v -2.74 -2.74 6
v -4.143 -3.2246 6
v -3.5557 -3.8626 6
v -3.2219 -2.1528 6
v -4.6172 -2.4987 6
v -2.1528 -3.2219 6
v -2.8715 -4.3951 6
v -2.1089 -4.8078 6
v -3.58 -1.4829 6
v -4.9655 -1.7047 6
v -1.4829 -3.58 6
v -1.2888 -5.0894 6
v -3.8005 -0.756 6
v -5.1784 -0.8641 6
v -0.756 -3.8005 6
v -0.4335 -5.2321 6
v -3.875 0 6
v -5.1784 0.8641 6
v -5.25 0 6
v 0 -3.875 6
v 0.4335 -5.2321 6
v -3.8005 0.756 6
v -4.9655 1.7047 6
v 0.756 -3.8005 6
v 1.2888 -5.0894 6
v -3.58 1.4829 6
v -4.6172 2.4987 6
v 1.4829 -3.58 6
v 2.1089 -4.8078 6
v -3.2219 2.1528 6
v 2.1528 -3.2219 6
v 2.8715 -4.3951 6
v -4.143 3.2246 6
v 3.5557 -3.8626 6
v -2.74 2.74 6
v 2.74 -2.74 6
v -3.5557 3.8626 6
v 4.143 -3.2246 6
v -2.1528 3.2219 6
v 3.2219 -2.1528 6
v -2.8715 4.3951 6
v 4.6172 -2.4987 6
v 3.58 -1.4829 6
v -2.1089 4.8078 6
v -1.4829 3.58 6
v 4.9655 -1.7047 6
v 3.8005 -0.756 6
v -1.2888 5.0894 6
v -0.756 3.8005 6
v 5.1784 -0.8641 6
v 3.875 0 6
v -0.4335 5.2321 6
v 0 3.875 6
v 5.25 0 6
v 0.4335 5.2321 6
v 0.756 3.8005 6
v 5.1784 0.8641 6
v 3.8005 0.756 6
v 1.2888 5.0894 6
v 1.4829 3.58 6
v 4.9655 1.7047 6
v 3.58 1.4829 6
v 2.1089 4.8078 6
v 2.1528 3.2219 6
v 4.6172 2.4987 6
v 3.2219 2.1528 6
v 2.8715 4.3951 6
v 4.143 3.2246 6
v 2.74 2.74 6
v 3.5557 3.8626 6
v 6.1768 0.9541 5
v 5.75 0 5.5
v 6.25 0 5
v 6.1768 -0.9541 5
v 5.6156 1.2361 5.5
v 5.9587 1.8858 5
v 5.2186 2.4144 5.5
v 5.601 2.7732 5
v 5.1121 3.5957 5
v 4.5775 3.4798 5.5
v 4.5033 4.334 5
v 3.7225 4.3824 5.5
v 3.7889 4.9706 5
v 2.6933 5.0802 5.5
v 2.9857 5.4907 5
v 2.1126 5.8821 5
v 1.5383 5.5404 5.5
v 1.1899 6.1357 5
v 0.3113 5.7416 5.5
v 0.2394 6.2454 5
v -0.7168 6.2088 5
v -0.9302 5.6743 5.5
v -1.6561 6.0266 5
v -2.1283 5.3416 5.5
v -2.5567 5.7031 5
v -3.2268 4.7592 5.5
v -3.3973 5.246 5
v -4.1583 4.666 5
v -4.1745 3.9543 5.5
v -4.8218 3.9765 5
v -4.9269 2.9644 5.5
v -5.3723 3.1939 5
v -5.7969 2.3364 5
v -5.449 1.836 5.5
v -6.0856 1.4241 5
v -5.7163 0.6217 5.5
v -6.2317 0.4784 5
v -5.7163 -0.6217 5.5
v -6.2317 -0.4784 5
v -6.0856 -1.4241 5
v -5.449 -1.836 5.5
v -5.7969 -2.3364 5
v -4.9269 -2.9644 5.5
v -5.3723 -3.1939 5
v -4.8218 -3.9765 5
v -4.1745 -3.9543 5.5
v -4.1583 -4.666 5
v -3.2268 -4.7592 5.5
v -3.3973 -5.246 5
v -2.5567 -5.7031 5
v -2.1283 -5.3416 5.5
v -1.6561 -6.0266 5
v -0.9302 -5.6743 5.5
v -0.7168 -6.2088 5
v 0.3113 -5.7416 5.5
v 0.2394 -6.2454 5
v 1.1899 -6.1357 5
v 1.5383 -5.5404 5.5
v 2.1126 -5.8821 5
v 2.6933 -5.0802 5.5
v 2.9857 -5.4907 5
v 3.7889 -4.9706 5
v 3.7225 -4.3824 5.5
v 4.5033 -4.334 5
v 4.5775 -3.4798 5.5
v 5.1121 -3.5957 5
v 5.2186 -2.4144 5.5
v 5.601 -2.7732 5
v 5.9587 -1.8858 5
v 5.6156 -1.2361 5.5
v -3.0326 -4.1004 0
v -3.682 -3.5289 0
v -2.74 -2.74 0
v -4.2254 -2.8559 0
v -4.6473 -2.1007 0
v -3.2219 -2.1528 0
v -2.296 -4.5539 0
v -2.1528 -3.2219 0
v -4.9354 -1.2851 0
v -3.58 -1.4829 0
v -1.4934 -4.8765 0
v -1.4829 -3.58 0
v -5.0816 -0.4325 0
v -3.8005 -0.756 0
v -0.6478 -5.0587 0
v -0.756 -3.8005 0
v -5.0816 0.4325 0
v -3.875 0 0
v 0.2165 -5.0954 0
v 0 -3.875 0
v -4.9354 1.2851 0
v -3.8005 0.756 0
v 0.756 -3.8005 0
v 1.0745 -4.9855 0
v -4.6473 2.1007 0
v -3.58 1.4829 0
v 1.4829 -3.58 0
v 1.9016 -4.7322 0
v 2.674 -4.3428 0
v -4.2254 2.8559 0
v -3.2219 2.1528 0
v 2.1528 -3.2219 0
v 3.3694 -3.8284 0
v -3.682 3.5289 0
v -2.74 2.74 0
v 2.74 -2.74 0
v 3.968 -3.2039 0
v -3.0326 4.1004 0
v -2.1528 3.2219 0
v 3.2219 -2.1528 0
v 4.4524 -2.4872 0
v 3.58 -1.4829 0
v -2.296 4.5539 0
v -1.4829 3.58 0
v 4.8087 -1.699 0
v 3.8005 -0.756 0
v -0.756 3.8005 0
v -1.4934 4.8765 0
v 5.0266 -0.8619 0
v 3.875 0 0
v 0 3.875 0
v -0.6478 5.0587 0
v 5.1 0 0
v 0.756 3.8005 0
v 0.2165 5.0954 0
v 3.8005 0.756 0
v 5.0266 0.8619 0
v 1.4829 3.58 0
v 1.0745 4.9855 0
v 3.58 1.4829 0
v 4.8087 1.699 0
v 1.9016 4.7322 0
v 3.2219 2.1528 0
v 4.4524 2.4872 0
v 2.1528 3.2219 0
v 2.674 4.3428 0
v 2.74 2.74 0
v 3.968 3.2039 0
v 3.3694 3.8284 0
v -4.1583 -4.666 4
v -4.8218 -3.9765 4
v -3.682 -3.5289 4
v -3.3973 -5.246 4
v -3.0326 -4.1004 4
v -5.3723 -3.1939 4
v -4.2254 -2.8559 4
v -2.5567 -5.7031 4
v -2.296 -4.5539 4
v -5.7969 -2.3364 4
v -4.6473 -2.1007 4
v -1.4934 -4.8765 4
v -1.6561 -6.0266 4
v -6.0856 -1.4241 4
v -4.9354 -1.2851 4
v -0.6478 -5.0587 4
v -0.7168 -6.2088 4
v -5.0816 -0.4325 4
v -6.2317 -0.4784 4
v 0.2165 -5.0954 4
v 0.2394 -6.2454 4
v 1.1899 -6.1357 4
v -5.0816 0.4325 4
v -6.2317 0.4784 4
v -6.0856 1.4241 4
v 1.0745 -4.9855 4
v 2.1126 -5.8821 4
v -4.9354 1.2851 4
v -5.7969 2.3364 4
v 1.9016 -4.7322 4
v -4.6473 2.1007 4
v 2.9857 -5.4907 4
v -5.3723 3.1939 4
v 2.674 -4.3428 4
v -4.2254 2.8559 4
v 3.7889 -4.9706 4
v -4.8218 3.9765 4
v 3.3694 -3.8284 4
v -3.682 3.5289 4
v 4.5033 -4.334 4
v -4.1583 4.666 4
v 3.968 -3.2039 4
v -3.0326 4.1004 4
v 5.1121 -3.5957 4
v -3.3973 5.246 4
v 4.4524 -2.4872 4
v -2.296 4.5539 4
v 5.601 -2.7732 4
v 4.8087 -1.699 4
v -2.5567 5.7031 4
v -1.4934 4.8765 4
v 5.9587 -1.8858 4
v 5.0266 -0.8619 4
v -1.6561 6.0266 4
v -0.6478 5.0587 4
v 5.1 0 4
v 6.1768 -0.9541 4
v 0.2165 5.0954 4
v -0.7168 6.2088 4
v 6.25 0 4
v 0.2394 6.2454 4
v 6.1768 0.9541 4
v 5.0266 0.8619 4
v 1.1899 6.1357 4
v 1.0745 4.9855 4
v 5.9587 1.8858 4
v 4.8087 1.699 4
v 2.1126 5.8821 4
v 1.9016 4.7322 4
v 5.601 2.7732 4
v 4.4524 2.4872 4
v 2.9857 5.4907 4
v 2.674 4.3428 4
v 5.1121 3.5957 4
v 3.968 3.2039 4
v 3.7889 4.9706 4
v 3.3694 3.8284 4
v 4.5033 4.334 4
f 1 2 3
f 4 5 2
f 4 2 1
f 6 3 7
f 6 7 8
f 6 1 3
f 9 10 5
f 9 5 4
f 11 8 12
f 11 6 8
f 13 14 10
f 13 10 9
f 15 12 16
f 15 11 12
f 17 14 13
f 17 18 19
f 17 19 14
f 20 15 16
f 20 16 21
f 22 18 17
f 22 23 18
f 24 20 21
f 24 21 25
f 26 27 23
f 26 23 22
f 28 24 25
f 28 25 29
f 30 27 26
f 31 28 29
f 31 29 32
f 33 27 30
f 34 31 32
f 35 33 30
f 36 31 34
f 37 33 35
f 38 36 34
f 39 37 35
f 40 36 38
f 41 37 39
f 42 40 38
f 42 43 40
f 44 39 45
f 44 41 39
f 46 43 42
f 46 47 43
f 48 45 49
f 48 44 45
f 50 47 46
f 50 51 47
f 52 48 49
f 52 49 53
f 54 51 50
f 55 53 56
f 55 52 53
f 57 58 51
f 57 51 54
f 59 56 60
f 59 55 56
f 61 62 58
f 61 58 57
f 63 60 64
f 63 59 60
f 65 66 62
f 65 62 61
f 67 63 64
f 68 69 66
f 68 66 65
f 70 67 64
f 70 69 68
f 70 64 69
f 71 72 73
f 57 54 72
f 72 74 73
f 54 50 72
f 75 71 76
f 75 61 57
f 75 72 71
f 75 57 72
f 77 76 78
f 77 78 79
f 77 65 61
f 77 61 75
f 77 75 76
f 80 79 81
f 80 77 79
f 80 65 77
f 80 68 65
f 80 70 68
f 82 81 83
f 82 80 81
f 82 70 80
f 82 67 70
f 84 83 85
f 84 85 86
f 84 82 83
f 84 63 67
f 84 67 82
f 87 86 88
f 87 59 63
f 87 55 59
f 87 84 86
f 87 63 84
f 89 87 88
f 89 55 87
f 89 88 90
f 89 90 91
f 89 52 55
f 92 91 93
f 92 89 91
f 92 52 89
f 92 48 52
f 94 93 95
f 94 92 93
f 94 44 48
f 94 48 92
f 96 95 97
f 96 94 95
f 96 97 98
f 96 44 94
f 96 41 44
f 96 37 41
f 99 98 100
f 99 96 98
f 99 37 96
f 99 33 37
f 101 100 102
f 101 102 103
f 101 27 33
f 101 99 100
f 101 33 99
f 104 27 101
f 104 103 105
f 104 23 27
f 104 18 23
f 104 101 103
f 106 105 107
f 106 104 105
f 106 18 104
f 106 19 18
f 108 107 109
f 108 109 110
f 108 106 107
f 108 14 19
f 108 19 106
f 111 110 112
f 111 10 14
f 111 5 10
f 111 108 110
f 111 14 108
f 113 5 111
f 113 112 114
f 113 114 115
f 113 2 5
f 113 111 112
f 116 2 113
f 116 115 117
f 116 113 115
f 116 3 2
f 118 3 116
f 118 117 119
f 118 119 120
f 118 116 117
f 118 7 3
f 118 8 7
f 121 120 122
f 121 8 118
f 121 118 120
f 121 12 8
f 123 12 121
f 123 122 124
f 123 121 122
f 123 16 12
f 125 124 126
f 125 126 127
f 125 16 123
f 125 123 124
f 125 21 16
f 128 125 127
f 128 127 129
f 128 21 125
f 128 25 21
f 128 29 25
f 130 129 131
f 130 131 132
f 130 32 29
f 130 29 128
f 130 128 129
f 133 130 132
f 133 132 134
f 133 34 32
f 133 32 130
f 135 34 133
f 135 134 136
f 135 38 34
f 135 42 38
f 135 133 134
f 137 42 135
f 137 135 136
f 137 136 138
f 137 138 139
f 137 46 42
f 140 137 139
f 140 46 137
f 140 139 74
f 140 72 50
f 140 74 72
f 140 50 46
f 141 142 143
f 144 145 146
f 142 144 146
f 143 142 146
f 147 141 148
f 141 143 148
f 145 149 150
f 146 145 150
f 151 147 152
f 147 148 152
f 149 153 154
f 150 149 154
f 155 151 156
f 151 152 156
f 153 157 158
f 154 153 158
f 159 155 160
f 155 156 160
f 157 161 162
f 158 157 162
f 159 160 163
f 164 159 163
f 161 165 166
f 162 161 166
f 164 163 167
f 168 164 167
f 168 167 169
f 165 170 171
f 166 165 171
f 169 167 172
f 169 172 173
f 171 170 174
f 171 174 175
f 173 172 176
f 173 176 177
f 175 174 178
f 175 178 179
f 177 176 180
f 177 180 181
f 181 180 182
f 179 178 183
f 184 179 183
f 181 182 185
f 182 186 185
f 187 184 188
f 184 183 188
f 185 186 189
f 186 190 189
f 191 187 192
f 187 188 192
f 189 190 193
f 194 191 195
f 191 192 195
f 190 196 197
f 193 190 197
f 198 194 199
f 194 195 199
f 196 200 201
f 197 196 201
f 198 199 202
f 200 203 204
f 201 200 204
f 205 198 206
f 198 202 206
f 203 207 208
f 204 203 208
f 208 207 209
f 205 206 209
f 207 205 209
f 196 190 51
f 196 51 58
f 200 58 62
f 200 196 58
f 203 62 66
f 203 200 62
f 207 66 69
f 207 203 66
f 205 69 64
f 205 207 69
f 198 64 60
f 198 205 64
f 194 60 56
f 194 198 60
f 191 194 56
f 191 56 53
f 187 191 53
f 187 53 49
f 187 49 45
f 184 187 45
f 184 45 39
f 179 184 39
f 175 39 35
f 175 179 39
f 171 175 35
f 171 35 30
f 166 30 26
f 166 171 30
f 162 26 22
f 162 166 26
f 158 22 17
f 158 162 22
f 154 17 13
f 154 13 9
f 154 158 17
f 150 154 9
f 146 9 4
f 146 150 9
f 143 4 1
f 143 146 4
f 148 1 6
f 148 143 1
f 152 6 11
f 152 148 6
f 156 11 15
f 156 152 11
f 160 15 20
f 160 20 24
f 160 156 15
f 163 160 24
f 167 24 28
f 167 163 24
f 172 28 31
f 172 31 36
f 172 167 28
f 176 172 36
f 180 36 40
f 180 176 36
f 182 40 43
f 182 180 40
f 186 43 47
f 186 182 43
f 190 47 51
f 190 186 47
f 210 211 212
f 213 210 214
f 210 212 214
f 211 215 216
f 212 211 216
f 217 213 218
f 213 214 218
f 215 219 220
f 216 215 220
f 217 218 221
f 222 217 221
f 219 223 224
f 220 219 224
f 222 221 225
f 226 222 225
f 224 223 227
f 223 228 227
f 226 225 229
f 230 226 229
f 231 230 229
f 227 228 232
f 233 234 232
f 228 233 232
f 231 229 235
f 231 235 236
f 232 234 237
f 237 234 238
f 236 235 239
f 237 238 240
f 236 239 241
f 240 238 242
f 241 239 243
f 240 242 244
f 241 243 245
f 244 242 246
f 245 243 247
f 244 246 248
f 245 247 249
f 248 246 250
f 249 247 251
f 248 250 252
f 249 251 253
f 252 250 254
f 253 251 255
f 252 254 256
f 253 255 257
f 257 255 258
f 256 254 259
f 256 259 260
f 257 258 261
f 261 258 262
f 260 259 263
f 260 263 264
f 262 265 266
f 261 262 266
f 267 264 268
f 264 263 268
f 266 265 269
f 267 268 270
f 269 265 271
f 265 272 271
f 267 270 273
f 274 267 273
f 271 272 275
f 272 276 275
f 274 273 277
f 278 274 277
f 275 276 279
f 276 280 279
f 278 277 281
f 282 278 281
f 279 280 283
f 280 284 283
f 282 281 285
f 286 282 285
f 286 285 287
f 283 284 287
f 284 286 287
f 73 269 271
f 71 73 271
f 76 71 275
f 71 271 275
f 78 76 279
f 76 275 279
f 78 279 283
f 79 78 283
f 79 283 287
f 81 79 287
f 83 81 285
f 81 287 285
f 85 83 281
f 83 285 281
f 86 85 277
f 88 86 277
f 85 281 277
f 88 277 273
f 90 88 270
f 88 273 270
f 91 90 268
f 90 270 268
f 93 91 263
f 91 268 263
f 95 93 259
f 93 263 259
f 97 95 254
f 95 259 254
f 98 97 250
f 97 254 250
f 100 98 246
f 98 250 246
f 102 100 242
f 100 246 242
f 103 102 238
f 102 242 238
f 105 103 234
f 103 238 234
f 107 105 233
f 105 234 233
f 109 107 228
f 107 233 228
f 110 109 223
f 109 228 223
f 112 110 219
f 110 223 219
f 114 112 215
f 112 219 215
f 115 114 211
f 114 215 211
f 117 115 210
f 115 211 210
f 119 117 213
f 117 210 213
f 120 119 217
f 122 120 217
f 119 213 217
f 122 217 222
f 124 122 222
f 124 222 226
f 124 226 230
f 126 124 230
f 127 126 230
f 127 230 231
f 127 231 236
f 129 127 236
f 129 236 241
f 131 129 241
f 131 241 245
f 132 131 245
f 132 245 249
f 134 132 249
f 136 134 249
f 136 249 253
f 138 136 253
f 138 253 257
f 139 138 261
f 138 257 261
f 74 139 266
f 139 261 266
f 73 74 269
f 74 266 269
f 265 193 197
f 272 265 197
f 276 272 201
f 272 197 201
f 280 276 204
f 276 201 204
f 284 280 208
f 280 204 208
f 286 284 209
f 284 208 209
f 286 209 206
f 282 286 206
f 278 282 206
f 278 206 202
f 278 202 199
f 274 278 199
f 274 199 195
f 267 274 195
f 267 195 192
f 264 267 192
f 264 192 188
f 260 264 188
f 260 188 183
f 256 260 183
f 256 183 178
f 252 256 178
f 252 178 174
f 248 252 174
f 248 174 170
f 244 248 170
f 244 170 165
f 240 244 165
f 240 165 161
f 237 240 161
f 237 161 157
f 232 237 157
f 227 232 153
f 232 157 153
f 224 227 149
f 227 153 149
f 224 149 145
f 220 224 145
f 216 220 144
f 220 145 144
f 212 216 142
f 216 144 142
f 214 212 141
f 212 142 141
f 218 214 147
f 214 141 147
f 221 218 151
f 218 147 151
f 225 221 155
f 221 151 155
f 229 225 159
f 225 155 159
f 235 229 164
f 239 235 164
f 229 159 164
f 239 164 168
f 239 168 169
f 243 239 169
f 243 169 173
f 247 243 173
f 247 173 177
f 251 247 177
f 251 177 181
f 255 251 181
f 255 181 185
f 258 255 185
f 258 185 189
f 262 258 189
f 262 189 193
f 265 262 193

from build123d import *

# Parameters (mm, degrees)
F0_R     = 5.1
F0_R_2   = 3.875
F1_DEPTH = 6
F2_START = 4
F0_R_3   = 6.25
F2_DEPTH = 2
F3_SIZE  = 1


with BuildPart() as f1:
    # F0 (on Top) → F1 (new body)
    with BuildSketch(Plane.XY):
        Circle(F0_R)
        Circle(F0_R_2, mode=Mode.SUBTRACT)
    extrude(amount=F1_DEPTH)

    # F0 (on Top) → F2 (join)
    with BuildSketch(Plane.XY.offset(F2_START)):
        Circle(F0_R_3)
        Circle(F0_R, mode=Mode.SUBTRACT)
    extrude(amount=F2_DEPTH)

    # F3
    f3_edges = [f1.edges().sort_by_distance(p)[0] for p in [
        (-6.25, 0, 6),
    ]]
    chamfer(f3_edges, length=F3_SIZE)


solid = f1.part
